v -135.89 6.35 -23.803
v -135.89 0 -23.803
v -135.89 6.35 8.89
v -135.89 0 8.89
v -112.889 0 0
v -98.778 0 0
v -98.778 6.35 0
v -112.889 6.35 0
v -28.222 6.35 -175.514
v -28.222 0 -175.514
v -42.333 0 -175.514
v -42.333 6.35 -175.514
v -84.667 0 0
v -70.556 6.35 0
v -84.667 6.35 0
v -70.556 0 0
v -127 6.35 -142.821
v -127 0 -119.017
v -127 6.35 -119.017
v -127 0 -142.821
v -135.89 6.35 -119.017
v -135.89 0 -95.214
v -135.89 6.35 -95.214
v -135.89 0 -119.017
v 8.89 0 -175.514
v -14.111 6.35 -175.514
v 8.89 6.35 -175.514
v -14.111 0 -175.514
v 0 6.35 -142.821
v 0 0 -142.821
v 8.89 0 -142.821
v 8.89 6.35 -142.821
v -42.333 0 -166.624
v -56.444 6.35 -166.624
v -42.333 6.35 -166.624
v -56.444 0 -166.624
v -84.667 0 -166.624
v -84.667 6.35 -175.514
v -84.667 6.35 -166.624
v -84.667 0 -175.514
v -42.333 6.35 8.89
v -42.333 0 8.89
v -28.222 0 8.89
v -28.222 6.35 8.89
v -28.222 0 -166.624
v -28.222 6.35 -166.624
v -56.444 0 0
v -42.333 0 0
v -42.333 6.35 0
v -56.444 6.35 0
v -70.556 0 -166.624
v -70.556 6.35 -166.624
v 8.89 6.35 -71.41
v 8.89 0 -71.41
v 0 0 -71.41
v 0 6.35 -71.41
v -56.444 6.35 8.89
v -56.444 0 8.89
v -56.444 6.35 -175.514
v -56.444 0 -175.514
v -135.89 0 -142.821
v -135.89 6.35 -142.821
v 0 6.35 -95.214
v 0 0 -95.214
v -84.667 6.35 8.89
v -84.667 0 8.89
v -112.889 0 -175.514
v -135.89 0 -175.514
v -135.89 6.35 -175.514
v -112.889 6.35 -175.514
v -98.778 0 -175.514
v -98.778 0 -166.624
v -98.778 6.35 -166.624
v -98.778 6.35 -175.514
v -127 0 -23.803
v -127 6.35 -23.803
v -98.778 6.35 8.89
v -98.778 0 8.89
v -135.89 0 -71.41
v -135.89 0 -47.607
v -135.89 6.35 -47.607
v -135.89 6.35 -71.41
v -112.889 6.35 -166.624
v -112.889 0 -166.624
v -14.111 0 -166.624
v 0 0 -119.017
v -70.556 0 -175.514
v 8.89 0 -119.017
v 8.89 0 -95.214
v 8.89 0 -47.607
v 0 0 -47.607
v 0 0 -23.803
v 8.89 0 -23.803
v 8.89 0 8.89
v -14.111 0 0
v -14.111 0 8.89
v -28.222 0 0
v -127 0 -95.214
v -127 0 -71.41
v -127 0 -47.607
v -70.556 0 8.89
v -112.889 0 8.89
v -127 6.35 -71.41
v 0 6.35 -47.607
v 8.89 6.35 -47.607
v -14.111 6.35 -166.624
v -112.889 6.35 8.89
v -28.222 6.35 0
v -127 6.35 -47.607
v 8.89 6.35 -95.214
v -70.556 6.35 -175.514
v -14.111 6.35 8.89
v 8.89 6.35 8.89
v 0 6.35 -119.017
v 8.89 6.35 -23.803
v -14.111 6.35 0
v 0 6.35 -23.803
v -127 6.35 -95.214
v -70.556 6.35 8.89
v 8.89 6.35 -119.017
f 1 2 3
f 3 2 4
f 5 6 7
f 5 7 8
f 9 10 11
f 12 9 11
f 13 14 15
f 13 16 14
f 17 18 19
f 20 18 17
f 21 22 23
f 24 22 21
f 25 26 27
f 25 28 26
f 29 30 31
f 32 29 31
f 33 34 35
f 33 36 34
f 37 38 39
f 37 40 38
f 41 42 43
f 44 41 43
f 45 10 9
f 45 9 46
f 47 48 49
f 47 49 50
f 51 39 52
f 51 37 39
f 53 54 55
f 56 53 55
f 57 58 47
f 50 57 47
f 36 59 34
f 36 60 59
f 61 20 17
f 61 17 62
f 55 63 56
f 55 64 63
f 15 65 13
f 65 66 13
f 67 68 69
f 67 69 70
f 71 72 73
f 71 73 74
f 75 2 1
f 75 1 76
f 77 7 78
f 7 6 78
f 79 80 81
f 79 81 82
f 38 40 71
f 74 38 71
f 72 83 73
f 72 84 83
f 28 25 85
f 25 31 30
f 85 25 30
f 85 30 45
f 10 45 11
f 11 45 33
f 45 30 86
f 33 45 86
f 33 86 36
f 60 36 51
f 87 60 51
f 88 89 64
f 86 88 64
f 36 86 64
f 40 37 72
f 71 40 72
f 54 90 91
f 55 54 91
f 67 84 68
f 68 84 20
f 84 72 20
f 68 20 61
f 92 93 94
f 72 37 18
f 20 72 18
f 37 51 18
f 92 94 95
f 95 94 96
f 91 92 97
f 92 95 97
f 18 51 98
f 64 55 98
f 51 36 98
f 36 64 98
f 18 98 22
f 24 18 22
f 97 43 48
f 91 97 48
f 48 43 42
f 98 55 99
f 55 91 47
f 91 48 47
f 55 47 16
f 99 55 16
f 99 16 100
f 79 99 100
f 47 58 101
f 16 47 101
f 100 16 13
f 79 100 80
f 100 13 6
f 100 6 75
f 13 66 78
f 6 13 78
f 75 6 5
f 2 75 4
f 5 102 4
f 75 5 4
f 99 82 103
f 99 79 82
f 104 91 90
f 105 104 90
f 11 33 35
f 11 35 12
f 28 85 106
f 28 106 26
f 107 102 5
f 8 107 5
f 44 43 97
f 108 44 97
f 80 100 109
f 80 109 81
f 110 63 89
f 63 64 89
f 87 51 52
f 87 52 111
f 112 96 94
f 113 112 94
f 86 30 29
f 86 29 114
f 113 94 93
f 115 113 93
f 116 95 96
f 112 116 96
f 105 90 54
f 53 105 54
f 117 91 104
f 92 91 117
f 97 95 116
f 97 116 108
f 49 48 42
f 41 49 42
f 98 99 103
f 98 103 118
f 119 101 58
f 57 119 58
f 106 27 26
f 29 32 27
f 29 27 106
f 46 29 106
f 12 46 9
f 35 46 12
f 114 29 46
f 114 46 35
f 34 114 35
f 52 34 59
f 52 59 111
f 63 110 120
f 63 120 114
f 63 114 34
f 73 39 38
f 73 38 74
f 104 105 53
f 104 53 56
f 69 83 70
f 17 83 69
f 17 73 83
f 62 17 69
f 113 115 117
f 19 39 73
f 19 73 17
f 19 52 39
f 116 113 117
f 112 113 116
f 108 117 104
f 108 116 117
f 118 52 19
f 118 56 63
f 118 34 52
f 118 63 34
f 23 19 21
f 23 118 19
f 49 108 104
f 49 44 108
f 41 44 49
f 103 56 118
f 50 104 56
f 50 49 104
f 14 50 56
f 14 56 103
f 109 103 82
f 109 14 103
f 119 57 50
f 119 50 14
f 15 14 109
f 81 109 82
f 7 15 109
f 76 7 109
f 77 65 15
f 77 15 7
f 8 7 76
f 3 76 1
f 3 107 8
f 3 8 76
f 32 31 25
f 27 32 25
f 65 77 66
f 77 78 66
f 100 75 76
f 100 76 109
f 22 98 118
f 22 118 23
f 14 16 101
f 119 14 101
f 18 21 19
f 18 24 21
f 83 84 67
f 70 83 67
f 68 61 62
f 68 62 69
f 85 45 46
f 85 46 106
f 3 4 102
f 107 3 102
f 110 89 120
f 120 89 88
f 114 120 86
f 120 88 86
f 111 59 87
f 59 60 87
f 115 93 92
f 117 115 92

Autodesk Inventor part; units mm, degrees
ref_plane "YZ Plane" through (0, 0, 0) normal (1, 0, 0) x (0, 1, 0)
ref_plane "XZ Plane" through (0, 0, 0) normal (0, 1, 0) x (-1, 0, 0)
ref_plane "XY Plane" through (0, 0, 0) normal (0, 0, 1) x (1, 0, 0)
sketch "Sketch1" plane through (0, 0, 0) normal (0, 1, 0) x (-1, 0, 0)
  line L0 (0, 0) -> (127, 0)
  line L1 (127, 0) -> (127, -166.624)
  line L2 (127, -166.624) -> (0, -166.624)
  line L3 (0, -166.624) -> (0, 0)
  dimension "BoxHeight" = 127
  dimension "d1" = 166.624
sketch "Sketch2" plane through (0, 0, 0) normal (0, 1, 0) x (-1, 0, 0)
  line L0 (0, 0) -> (-8.89, 0)
  line L1 (-8.89, 0) -> (-8.89, -23.8034)
  line L2 (-8.89, -23.8034) -> (0, -23.8034)
  line L3 (0, -23.8034) -> (0, 0)
  line L4 (0, -166.624) -> (0, 0) projected
  line L5 (0, 0) -> (127, 0) projected
  line L6 (0, -47.6069) -> (-8.89, -47.6069)
  line L7 (-8.89, -47.6069) -> (-8.89, -71.4103)
  line L8 (-8.89, -71.4103) -> (0, -71.4103)
  line L9 (0, -71.4103) -> (0, -47.6069)
  line L10 (0, -95.2137) -> (-8.89, -95.2137)
  line L11 (-8.89, -95.2137) -> (-8.89, -119.0171)
  line L12 (-8.89, -119.0171) -> (0, -119.0171)
  line L13 (0, -119.0171) -> (0, -95.2137)
  line L14 (63.5, 0) -> (63.5, -115.824) construction
  line L15 (127, -23.8034) -> (127, 0)
  line L16 (127, -166.624) -> (127, 0)
  line L17 (127, -71.4103) -> (127, -47.6069)
  line L18 (127, -119.0171) -> (127, -95.2137)
  line L19 (28.2222, -166.624) -> (14.1111, -166.624)
  line L20 (14.1111, -166.624) -> (14.1111, -175.514)
  line L21 (14.1111, -175.514) -> (28.2222, -175.514)
  line L22 (28.2222, -175.514) -> (28.2222, -166.624)
  line L23 (127, -166.624) -> (0, -166.624) projected
  line L24 (56.4444, -166.624) -> (42.3333, -166.624)
  line L25 (42.3333, -166.624) -> (42.3333, -175.514)
  line L26 (42.3333, -175.514) -> (56.4444, -175.514)
  line L27 (56.4444, -175.514) -> (56.4444, -166.624)
  line L28 (84.6667, -166.624) -> (70.5556, -166.624)
  line L29 (70.5556, -166.624) -> (70.5556, -175.514)
  line L30 (70.5556, -175.514) -> (84.6667, -175.514)
  line L31 (84.6667, -175.514) -> (84.6667, -166.624)
  line L32 (112.8889, -166.624) -> (98.7778, -166.624)
  line L33 (98.7778, -166.624) -> (98.7778, -175.514)
  line L34 (98.7778, -175.514) -> (112.8889, -175.514)
  line L35 (112.8889, -175.514) -> (112.8889, -166.624)
  line L36 (127, -83.312) -> (0, -83.312) construction
  line L37 (63.5, -166.624) -> (63.5, -50.8) construction
  line L38 (28.2222, 0) -> (14.1111, 0)
  line L39 (14.1111, 0) -> (14.1111, 8.89)
  line L40 (14.1111, 8.89) -> (28.2222, 8.89)
  line L41 (28.2222, 8.89) -> (28.2222, 0)
  line L42 (127, 0) -> (0, 0)
  line L43 (56.4444, 0) -> (42.3333, 0)
  line L44 (42.3333, 0) -> (42.3333, 8.89)
  line L45 (42.3333, 8.89) -> (56.4444, 8.89)
  line L46 (56.4444, 8.89) -> (56.4444, 0)
  line L47 (84.6667, 0) -> (70.5556, 0)
  line L48 (70.5556, 0) -> (70.5556, 8.89)
  line L49 (84.6667, 8.89) -> (84.6667, 0)
  line L50 (70.5556, 8.89) -> (84.6667, 8.89)
  line L51 (112.8889, 0) -> (98.7778, 0)
  line L52 (98.7778, 0) -> (98.7778, 8.89)
  line L53 (112.8889, 8.89) -> (112.8889, 0)
  line L54 (98.7778, 8.89) -> (112.8889, 8.89)
  line L55 (0, -142.8206) -> (-8.89, -142.8206)
  line L56 (-8.89, -142.8206) -> (-8.89, -159.3669)
  line L57 (-8.89, -159.3669) -> (0, -159.3669)
  line L58 (0, -159.3669) -> (0, -142.8206)
  line L59 (127, -166.624) -> (127, 0)
  line L60 (127, 0) -> (135.89, 0)
  line L61 (135.89, 0) -> (135.89, -23.8034)
  line L62 (135.89, -23.8034) -> (127, -23.8034)
  line L63 (127, -23.8034) -> (127, 0)
  line L64 (127, -166.624) -> (127, 0)
  line L65 (127, -47.6069) -> (135.89, -47.6069)
  line L66 (135.89, -47.6069) -> (135.89, -71.4103)
  line L67 (135.89, -71.4103) -> (127, -71.4103)
  line L68 (127, -71.4103) -> (127, -47.6069)
  line L69 (127, -95.2137) -> (135.89, -95.2137)
  line L70 (135.89, -95.2137) -> (135.89, -119.0171)
  line L71 (135.89, -119.0171) -> (127, -119.0171)
  line L72 (127, -119.0171) -> (127, -95.2137)
  line L73 (135.89, -142.8206) -> (135.89, -159.3669)
  line L74 (127, -142.8206) -> (135.89, -142.8206)
  line L75 (127, -159.3669) -> (127, -142.8206)
  line L76 (135.89, -159.3669) -> (127, -159.3669)
  line L77 (14.1111, -175.514) -> (0, -175.514)
  line L78 (0, -175.514) -> (0, -159.3669)
  line L79 (0, -159.3669) -> (14.1111, -159.3669)
  line L80 (14.1111, -159.3669) -> (14.1111, -175.514)
  line L81 (28.2222, -175.514) -> (42.3333, -175.514)
  line L82 (42.3333, -175.514) -> (42.3333, -166.624)
  line L83 (42.3333, -166.624) -> (28.2222, -166.624)
  line L84 (28.2222, -166.624) -> (28.2222, -175.514)
  line L85 (56.4444, -175.514) -> (70.5556, -175.514)
  line L86 (70.5556, -175.514) -> (70.5556, -166.624)
  line L87 (70.5556, -166.624) -> (56.4444, -166.624)
  line L88 (56.4444, -166.624) -> (56.4444, -175.514)
  line L89 (84.6667, -175.514) -> (98.7778, -175.514)
  line L90 (98.7778, -175.514) -> (98.7778, -166.624)
  line L91 (98.7778, -166.624) -> (84.6667, -166.624)
  line L92 (84.6667, -166.624) -> (84.6667, -175.514)
  line L93 (112.8889, -175.514) -> (127, -175.514)
  line L94 (127, -175.514) -> (127, -159.3669)
  line L95 (127, -159.3669) -> (112.8889, -159.3669)
  line L96 (112.8889, -159.3669) -> (112.8889, -175.514)
  line L97 (112.8889, 0) -> (127, 0)
  line L98 (127, 0) -> (127, 8.89)
  line L99 (127, 8.89) -> (112.8889, 8.89)
  line L100 (112.8889, 8.89) -> (112.8889, 0)
  line L101 (98.7778, 8.89) -> (84.6667, 8.89)
  line L102 (84.6667, 8.89) -> (84.6667, 0)
  line L103 (84.6667, 0) -> (98.7778, 0)
  line L104 (98.7778, 0) -> (98.7778, 8.89)
  line L105 (70.5556, 8.89) -> (56.4444, 8.89)
  line L106 (56.4444, 8.89) -> (56.4444, 0)
  line L107 (56.4444, 0) -> (70.5556, 0)
  line L108 (70.5556, 0) -> (70.5556, 8.89)
  line L109 (42.3333, 8.89) -> (28.2222, 8.89)
  line L110 (28.2222, 8.89) -> (28.2222, 0)
  line L111 (28.2222, 0) -> (42.3333, 0)
  line L112 (42.3333, 0) -> (42.3333, 8.89)
  line L113 (14.1111, 8.89) -> (0, 8.89)
  line L114 (0, 8.89) -> (0, 0)
  line L115 (0, 0) -> (14.1111, 0)
  line L116 (14.1111, 0) -> (14.1111, 8.89)
  line L117 (0, 0) -> (-8.89, 0)
  line L118 (-8.89, 0) -> (-8.89, 8.89)
  line L119 (-8.89, 8.89) -> (0, 8.89)
  line L120 (0, 8.89) -> (0, 0)
  line L121 (0, -159.3669) -> (-8.89, -159.3669)
  line L122 (-8.89, -159.3669) -> (-8.89, -168.2569)
  line L123 (-8.89, -168.2569) -> (0, -168.2569)
  line L124 (0, -168.2569) -> (0, -159.3669)
  line L125 (127, -159.3669) -> (135.89, -159.3669)
  line L126 (135.89, -159.3669) -> (135.89, -168.2569)
  line L127 (135.89, -168.2569) -> (127, -168.2569)
  line L128 (127, -168.2569) -> (127, -159.3669)
  line L129 (127, 0) -> (135.89, 0)
  line L130 (135.89, 0) -> (135.89, 8.89)
  line L131 (135.89, 8.89) -> (127, 8.89)
  line L132 (127, 8.89) -> (127, 0)
  line L133 (127, -168.2569) -> (135.89, -168.2569)
  line L134 (135.89, -168.2569) -> (135.89, -175.514)
  line L135 (135.89, -175.514) -> (127, -175.514)
  line L136 (127, -175.514) -> (127, -168.2569)
  line L137 (0, -168.2569) -> (-8.89, -168.2569)
  line L138 (-8.89, -168.2569) -> (-8.89, -175.514)
  line L139 (-8.89, -175.514) -> (0, -175.514)
  line L140 (0, -175.514) -> (0, -168.2569)
  dimension "d2" = 8.89
  dimension "d3" = 23.8034
  dimension "d5" = 8.89
  dimension "d6" = 23.8034
  dimension "d7" = 23.8034
  dimension "d8" = 8.89
  dimension "d9" = 23.8034
  dimension "d10" = 23.8034
  dimension "d11" = 14.1111
  dimension "d12" = 127
  dimension "d13" = 14.1111
  dimension "d14" = 8.89
  dimension "d15" = 8.89
  dimension "d16" = 14.1111
  dimension "d17" = 8.89
  dimension "d18" = 14.1111
  dimension "d22" = 8.89
  dimension "d23" = 14.1111
  dimension "d27" = 14.1111
  dimension "d28" = 14.1111
  dimension "d29" = 14.1111
  dimension "d34" = 8.89
  dimension "d35" = 16.5463
  dimension "d40" = 23.8034
  dimension "d41" = 8.89
  dimension "d42" = 8.89
  dimension "d43" = 8.89
  dimension "d44" = 8.89
  dimension "d45" = 8.89
  dimension "d46" = 8.89
  dimension "d47" = 8.89
  dimension "d48" = 8.89
extrude "Connections" add sketch "Sketch2" along normal blind 6.35 contours L3 L2 L1 L0 | L114 L113 L39 L5 | L0 L118 L119 L114 | L4 L8 L7 L6 | L41 L109 L44 L5 | L4 L12 L11 L10 | L46 L105 L48 L5 | L4 L57 L56 L55 | L49 L101 L52 L5 | L79 L80 L23 L4 | L4 L78 L123 L122 L57 | L23 L20 L77 L78 | L53 L99 L98 L5 | L78 L139 L138 L123 | L60 L61 L62 L15 | L98 L131 L130 L60 | L23 L25 L81 L22 | L65 L66 L67 L16 | L23 L29 L85 L27 | L69 L70 L71 L16 | L23 L33 L89 L31 | L74 L73 L76 L16 | L96 L95 L16 L23 | L23 L94 L93 L35 | L76 L126 L127 L94 L16 | L94 L127 L134 L135
extrude "Base Extrusion" add sketch "Sketch1" along normal blind 6.35
sketch "Sketch3" plane through (0, 6.35, 0) normal (0, 1, 0) x (1, 0, 0)
  line L0 (-6.2788, 64.0613) -> (-6.2788, 44.7093) construction
  line L1 (-6.2788, 44.7093) -> (-46.5625, 44.7093) construction
  line L2 (-46.5625, 44.7093) -> (-46.5625, 64.0613) construction
  line L3 (-46.5625, 64.0613) -> (-6.2788, 64.0613) construction
  point P0 (0, 0)
sketch "Sketch4" plane through (0, 6.35, 0) normal (0, 1, 0) x (1, 0, 0)
  point P0 (0, 0)
sketch "Sketch5" plane through (0, 6.35, 0) normal (0, 1, 0) x (1, 0, 0)
  line L0 (-127, 119.0171) -> (-135.89, 119.0171) projected
  line L1 (-135.89, 119.0171) -> (-135.89, 95.2137) projected
  line L2 (-135.89, 95.2137) -> (-127, 95.2137) projected
  line L3 (-127, 95.2137) -> (-127, 71.4103) projected
  line L4 (-127, 71.4103) -> (-135.89, 71.4103) projected
  line L5 (-135.89, 71.4103) -> (-135.89, 47.6069) projected
  line L6 (-135.89, 47.6069) -> (-127, 47.6069) projected
  line L7 (-127, 47.6069) -> (-127, 23.8034) projected
  line L8 (-127, 23.8034) -> (-135.89, 23.8034) projected
  line L9 (-135.89, 23.8034) -> (-135.89, -8.89) projected
  line L10 (-135.89, -8.89) -> (-112.8889, -8.89) projected
  line L11 (-112.8889, -8.89) -> (-112.8889, 0) projected
  line L12 (-112.8889, 0) -> (-98.7778, 0) projected
  line L13 (-98.7778, 0) -> (-98.7778, -8.89) projected
  line L14 (-98.7778, -8.89) -> (-84.6667, -8.89) projected
  line L15 (-84.6667, -8.89) -> (-84.6667, 0) projected
  line L16 (-84.6667, 0) -> (-70.5556, 0) projected
  line L17 (-70.5556, 0) -> (-70.5556, -8.89) projected
  line L18 (-70.5556, -8.89) -> (-56.4444, -8.89) projected
  line L19 (-56.4444, -8.89) -> (-56.4444, 0) projected
  line L20 (-56.4444, 0) -> (-42.3333, 0) projected
  line L21 (-42.3333, 0) -> (-42.3333, -8.89) projected
  line L22 (-42.3333, -8.89) -> (-28.2222, -8.89) projected
  line L23 (-28.2222, -8.89) -> (-28.2222, 0) projected
  line L24 (-28.2222, 0) -> (-14.1111, 0) projected
  line L25 (-14.1111, 0) -> (-14.1111, -8.89) projected
  line L26 (-14.1111, -8.89) -> (8.89, -8.89) projected
  line L27 (8.89, -8.89) -> (8.89, 23.8034) projected
  line L28 (8.89, 23.8034) -> (0, 23.8034) projected
  line L29 (0, 23.8034) -> (0, 47.6069) projected
  line L30 (0, 47.6069) -> (8.89, 47.6069) projected
  line L31 (8.89, 47.6069) -> (8.89, 71.4103) projected
  line L32 (8.89, 71.4103) -> (0, 71.4103) projected
  line L33 (0, 71.4103) -> (0, 95.2137) projected
  line L34 (0, 95.2137) -> (8.89, 95.2137) projected
  line L35 (8.89, 95.2137) -> (8.89, 119.0171) projected
  line L36 (8.89, 119.0171) -> (0, 119.0171) projected
  line L37 (0, 119.0171) -> (0, 142.8206) projected
  line L38 (0, 142.8206) -> (8.89, 142.8206) projected
  line L39 (8.89, 142.8206) -> (8.89, 175.514) projected
  line L40 (8.89, 175.514) -> (-14.1111, 175.514) projected
  line L41 (-14.1111, 175.514) -> (-14.1111, 166.624) projected
  line L42 (-14.1111, 166.624) -> (-28.2222, 166.624) projected
  line L43 (-28.2222, 166.624) -> (-28.2222, 175.514) projected
  line L44 (-28.2222, 175.514) -> (-42.3333, 175.514) projected
  line L45 (-42.3333, 175.514) -> (-42.3333, 166.624) projected
  line L46 (-42.3333, 166.624) -> (-56.4444, 166.624) projected
  line L47 (-56.4444, 166.624) -> (-56.4444, 175.514) projected
  line L48 (-56.4444, 175.514) -> (-70.5556, 175.514) projected
  line L49 (-70.5556, 175.514) -> (-70.5556, 166.624) projected
  line L50 (-70.5556, 166.624) -> (-84.6667, 166.624) projected
  line L51 (-84.6667, 166.624) -> (-84.6667, 175.514) projected
  line L52 (-84.6667, 175.514) -> (-98.7778, 175.514) projected
  line L53 (-98.7778, 175.514) -> (-98.7778, 166.624) projected
  line L54 (-98.7778, 166.624) -> (-112.8889, 166.624) projected
  line L55 (-112.8889, 166.624) -> (-112.8889, 175.514) projected
  line L56 (-112.8889, 175.514) -> (-135.89, 175.514) projected
  line L57 (-135.89, 175.514) -> (-135.89, 142.8206) projected
  line L58 (-135.89, 142.8206) -> (-127, 142.8206) projected
  line L59 (-127, 142.8206) -> (-127, 119.0171) projected
  point P0 (0, 0)
equation "\"d1\" = BaseWidth"
equation "\"d2\" = WallConA"
equation "\"d3\" = WallConB"
equation "\"d5\" = d2"
equation "\"d6\" = WallConSpace"
equation "\"d7\" = d4"
equation "\"d8\" = d2"
equation "\"d9\" = d6"
equation "\"d10\" = d4"
equation "\"d11\" = -0.8 * d13 + 0.2 * d12"
equation "\"d13\" = 0.111111 * d12"
equation "\"d14\" = WallConA"
equation "\"d15\" = d14"
equation "\"d16\" = d13"
equation "\"d17\" = d15"
equation "\"d18\" = d20"
equation "\"d22\" = d17"
equation "\"d23\" = d25"
equation "\"d27\" = d11"
equation "\"d28\" = d27"
equation "\"d29\" = d11"
equation "\"d34\" = d36"
equation "\"d35\" = d37"
equation "\"d40\" = d7"
equation "\"d41\" = d5"
equation "\"d42\" = d5"
equation "\"d43\" = d41"
equation "\"d44\" = d42"
equation "\"d45\" = d41"
equation "\"d46\" = d42"
equation "\"d47\" = d41"
equation "\"d48\" = d42"
equation "\"d4\" = WallConSpace"
equation "\"d20\" = 0.111111 * d21"
equation "\"d25\" = 0.111111 * d26"
equation "\"d36\" = d38"
equation "\"d37\" = d39"
equation "\"BaseWidth\" = 166.624"
equation "\"WallConA\" = 8.89"
equation "\"WallConB\" = 23.803429"
equation "\"WallConSpace\" = 23.803429"
equation "\"d21\" = 127"
equation "\"d26\" = 127"
equation "\"d38\" = 8.89"
equation "\"d39\" = 16.546286"
properties part number "WallToWall"
